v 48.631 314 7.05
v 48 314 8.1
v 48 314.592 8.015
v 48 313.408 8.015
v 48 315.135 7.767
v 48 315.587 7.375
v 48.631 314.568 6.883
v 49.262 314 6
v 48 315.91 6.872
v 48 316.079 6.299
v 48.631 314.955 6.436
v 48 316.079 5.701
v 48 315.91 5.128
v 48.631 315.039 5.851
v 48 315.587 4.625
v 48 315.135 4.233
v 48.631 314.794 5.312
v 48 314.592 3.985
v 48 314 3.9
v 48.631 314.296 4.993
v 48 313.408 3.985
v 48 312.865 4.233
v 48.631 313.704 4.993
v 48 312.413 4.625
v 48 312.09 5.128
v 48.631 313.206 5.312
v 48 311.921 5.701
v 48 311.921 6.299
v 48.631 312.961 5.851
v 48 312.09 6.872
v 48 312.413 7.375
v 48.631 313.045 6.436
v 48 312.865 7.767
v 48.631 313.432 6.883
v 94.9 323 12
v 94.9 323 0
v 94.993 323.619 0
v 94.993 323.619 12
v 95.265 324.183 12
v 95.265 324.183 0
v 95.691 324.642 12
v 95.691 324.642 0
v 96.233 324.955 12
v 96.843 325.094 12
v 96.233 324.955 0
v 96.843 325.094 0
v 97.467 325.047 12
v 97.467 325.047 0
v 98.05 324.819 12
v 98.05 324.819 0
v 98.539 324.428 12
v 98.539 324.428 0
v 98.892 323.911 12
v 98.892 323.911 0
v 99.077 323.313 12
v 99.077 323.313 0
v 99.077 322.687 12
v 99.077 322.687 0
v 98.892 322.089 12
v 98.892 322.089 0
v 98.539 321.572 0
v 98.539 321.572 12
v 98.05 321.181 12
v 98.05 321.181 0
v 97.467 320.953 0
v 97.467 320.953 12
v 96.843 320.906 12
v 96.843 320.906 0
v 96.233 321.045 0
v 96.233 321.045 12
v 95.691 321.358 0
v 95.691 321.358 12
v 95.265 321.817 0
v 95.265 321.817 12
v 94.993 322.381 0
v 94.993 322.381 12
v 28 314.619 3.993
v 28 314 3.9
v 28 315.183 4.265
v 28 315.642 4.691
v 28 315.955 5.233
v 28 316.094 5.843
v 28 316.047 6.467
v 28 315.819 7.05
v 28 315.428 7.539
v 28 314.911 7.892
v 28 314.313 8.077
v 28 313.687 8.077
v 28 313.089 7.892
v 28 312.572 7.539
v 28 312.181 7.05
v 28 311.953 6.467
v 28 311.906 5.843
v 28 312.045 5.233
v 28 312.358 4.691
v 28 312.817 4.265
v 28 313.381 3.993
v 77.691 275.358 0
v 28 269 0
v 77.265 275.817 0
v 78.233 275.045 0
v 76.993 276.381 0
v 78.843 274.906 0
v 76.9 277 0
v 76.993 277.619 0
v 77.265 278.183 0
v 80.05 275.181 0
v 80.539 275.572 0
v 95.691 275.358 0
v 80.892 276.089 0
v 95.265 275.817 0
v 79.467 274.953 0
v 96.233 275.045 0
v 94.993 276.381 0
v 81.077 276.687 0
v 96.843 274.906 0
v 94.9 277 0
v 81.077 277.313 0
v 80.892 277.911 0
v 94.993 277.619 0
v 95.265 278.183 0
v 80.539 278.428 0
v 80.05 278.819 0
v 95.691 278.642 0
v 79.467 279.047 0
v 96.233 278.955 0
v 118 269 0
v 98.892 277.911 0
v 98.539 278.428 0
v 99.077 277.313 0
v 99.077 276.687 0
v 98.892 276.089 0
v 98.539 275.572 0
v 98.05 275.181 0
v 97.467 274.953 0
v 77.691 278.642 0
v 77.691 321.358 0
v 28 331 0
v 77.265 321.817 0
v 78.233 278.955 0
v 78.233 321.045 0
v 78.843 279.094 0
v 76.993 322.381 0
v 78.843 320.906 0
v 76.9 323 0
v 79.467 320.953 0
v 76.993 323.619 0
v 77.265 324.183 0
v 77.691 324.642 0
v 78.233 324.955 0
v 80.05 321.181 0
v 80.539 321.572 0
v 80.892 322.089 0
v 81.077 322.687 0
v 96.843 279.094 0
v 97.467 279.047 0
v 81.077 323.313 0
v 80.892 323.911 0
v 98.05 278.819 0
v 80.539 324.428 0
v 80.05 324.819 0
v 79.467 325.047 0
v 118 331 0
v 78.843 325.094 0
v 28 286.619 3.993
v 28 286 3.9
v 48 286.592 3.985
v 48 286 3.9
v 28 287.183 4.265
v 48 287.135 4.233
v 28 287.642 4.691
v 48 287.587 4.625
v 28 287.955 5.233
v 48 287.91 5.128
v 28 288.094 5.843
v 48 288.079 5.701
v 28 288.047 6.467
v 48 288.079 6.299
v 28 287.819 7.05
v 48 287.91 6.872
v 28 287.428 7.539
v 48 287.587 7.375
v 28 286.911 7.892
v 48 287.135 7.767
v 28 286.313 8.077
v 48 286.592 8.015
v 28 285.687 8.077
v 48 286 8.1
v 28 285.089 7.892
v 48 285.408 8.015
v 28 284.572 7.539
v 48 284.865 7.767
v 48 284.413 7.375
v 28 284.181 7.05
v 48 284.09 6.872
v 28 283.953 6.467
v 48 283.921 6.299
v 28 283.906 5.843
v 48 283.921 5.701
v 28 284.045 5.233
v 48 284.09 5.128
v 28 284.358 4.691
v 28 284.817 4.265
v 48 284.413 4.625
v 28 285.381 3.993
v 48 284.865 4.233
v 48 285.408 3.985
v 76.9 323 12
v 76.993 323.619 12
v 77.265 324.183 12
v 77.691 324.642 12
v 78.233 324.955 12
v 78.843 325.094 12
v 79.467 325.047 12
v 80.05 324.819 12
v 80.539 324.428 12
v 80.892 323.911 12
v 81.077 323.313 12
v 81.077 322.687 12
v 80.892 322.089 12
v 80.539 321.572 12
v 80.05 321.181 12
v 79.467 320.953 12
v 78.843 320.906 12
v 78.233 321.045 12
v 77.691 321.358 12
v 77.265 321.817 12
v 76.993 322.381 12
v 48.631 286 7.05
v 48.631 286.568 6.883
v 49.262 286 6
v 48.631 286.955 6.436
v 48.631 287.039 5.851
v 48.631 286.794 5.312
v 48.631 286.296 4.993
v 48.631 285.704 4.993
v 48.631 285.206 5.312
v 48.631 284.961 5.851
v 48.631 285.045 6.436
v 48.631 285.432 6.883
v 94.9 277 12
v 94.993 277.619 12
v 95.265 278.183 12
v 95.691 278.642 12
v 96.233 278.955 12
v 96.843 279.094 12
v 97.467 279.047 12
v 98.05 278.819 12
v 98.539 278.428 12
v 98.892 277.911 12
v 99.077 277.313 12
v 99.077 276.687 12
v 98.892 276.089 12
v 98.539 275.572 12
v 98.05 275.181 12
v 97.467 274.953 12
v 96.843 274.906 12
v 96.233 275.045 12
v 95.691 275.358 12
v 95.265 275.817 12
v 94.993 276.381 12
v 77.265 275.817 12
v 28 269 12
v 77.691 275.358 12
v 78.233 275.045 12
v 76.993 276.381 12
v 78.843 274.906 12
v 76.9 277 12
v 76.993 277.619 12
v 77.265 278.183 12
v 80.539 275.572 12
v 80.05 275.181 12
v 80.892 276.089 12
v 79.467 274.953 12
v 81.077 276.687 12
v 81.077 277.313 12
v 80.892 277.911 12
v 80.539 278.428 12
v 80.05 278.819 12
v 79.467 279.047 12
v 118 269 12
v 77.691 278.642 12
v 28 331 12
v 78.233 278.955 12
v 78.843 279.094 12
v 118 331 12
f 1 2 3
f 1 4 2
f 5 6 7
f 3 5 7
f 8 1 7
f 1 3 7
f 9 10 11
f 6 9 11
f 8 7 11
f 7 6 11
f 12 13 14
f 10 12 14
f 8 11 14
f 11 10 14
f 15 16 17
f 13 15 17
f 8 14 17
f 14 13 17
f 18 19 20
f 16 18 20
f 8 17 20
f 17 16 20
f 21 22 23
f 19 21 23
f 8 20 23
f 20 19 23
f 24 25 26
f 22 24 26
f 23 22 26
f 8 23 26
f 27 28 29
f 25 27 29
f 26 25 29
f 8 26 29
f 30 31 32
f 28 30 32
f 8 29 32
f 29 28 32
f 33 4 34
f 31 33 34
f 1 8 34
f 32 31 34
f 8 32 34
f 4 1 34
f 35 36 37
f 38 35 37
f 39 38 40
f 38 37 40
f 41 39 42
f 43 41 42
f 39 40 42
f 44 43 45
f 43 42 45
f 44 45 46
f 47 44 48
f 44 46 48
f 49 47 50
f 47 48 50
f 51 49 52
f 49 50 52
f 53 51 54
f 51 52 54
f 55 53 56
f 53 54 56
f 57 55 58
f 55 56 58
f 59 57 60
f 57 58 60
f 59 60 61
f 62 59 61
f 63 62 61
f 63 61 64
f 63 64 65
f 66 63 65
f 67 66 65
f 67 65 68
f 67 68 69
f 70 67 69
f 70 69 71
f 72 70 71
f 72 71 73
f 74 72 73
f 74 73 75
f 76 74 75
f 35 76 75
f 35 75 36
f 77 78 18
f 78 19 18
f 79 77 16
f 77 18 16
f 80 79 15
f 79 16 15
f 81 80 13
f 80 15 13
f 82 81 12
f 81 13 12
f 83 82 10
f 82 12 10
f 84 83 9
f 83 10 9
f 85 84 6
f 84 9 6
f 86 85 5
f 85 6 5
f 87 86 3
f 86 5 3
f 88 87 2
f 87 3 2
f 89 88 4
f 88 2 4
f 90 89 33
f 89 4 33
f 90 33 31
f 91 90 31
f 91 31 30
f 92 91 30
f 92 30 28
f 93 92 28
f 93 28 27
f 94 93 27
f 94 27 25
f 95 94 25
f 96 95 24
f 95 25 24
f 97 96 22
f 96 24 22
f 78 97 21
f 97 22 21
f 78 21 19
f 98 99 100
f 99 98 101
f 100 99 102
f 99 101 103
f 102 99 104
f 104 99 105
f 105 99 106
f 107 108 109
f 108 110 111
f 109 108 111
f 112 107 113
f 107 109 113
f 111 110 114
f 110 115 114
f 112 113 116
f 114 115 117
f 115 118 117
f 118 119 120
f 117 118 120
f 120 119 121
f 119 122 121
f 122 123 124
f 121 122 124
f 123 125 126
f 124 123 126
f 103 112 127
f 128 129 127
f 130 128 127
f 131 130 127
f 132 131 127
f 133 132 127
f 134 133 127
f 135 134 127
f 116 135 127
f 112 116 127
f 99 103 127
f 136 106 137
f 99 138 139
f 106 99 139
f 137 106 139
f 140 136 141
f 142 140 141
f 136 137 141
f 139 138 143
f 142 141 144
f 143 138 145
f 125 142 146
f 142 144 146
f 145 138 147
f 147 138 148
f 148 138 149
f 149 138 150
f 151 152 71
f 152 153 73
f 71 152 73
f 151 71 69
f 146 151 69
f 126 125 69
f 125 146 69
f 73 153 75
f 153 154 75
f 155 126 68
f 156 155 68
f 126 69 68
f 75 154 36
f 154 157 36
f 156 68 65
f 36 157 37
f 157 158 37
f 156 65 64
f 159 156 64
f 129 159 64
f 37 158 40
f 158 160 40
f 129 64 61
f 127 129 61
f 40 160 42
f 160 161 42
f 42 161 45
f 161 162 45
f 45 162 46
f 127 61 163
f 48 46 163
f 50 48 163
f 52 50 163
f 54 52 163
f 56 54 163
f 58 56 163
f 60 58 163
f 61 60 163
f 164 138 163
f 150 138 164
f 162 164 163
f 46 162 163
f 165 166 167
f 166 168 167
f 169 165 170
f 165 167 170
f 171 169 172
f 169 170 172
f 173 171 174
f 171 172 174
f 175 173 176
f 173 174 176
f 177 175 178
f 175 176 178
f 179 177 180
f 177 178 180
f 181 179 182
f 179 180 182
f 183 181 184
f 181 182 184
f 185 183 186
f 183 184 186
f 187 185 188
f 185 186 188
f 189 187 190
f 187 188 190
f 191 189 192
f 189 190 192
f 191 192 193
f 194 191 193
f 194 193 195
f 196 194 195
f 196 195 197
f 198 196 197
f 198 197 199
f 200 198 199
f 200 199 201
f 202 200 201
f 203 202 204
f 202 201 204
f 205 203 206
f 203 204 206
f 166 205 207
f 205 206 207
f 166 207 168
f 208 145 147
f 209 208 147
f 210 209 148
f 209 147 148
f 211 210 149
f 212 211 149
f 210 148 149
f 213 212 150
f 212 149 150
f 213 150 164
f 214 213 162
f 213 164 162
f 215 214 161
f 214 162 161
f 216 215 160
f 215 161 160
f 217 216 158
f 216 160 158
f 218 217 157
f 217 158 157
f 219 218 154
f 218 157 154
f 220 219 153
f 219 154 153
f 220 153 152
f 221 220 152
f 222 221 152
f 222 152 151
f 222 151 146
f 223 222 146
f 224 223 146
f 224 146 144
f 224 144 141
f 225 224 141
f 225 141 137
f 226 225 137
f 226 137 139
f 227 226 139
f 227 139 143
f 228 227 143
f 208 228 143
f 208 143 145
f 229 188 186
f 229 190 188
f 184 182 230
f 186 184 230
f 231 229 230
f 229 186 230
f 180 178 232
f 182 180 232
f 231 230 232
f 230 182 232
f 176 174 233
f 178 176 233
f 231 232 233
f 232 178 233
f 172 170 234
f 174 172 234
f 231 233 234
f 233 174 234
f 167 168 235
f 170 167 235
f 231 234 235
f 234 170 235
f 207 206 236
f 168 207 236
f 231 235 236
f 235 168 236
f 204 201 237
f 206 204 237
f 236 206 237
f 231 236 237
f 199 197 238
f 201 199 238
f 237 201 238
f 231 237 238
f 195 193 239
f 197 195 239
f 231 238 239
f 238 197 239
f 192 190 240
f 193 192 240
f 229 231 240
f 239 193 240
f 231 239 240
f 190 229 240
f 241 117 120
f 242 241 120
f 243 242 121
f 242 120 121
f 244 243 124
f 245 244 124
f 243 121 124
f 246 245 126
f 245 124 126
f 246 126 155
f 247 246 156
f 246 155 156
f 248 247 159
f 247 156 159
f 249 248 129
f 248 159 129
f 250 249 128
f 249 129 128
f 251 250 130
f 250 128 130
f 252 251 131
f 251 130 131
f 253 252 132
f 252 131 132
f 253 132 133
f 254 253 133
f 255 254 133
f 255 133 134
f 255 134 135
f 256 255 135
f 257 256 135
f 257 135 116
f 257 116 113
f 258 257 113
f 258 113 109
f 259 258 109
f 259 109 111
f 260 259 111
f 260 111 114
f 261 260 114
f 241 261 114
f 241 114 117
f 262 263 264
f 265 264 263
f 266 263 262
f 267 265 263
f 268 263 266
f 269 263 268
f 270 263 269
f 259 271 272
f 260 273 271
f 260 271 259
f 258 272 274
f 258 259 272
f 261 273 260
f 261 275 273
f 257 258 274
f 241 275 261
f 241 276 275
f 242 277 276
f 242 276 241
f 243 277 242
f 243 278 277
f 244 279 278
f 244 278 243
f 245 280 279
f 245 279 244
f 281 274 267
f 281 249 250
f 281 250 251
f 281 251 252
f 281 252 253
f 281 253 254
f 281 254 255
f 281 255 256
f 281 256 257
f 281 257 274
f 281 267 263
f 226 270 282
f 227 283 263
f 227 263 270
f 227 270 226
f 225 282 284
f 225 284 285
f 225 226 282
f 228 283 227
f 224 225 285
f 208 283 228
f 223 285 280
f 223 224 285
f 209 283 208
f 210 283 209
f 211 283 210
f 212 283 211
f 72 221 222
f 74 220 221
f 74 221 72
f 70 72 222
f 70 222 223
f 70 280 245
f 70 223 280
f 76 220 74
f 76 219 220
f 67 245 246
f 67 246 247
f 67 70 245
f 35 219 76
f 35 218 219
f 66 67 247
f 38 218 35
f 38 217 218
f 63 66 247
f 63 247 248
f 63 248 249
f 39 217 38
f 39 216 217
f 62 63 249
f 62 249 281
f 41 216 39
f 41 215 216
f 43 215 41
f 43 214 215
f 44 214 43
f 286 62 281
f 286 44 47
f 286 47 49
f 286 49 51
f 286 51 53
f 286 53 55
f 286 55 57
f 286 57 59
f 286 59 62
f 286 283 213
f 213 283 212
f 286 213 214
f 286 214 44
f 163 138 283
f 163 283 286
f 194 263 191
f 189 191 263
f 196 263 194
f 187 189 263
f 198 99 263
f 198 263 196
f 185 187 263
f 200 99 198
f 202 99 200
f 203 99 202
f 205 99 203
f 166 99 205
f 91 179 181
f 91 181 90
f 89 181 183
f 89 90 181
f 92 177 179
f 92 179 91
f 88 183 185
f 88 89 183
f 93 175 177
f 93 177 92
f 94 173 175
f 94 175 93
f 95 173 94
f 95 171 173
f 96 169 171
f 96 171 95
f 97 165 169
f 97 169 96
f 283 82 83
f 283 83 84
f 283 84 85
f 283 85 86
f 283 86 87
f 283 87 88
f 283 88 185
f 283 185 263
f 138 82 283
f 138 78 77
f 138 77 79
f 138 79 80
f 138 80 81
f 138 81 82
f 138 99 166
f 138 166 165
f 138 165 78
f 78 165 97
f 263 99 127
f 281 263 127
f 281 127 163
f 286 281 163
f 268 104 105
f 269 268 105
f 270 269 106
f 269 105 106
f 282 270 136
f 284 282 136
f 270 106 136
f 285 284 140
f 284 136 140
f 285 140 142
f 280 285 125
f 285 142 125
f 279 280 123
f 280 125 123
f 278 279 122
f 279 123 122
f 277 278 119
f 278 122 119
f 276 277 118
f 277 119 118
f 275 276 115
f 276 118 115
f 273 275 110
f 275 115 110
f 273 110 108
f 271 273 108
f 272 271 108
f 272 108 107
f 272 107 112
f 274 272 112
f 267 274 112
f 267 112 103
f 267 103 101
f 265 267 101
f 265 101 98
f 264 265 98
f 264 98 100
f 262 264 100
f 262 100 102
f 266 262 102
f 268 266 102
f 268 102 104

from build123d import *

# Parameters (mm, degrees)
SZKIC1_W                       = 90
SZKIC1_H                       = 62
DODANIE_WYCI_GNI_CIE1_DEPTH    = 12
OTW_R_GWINTOWANY_M5X0_81_D     = 4.2
OTW_R_GWINTOWANY_M5X0_81_DEPTH = 14
OTW_R_GWINTOWANY_M5X0_81_TIP   = 1.2618073
OTW_R_GWINTOWANY_M5X0_82_D     = 4.2
OTW_R_GWINTOWANY_M5X0_82_DEPTH = 20
OTW_R_GWINTOWANY_M5X0_82_TIP   = 1.2618073


with BuildPart() as part:
    # Szkic1 → Dodanie-wyciągnięcie1 (new body)
    with BuildSketch(Plane.XY):
        with Locations((73, 300)):
            Rectangle(SZKIC1_W, SZKIC1_H)
    extrude(amount=DODANIE_WYCI_GNI_CIE1_DEPTH)

    # Otwór gwintowany M5x0.81
    with Locations(Plane.XY.offset(12)):
        with Locations((97, 323), (79, 323), (79, 277), (97, 277)):
            Hole(OTW_R_GWINTOWANY_M5X0_81_D / 2, depth=OTW_R_GWINTOWANY_M5X0_81_DEPTH)
            with Locations((0, 0, -(OTW_R_GWINTOWANY_M5X0_81_DEPTH + OTW_R_GWINTOWANY_M5X0_81_TIP / 2))):  # 118° drill point
                Cone(0, OTW_R_GWINTOWANY_M5X0_81_D / 2, OTW_R_GWINTOWANY_M5X0_81_TIP, mode=Mode.SUBTRACT)

    # Otwór gwintowany M5x0.82
    with Locations(Plane.ZY.offset(-28)):
        with Locations((6, 286), (6, 314)):
            Hole(OTW_R_GWINTOWANY_M5X0_82_D / 2, depth=OTW_R_GWINTOWANY_M5X0_82_DEPTH)
            with Locations((0, 0, -(OTW_R_GWINTOWANY_M5X0_82_DEPTH + OTW_R_GWINTOWANY_M5X0_82_TIP / 2))):  # 118° drill point
                Cone(0, OTW_R_GWINTOWANY_M5X0_82_D / 2, OTW_R_GWINTOWANY_M5X0_82_TIP, mode=Mode.SUBTRACT)


solid = part.part
